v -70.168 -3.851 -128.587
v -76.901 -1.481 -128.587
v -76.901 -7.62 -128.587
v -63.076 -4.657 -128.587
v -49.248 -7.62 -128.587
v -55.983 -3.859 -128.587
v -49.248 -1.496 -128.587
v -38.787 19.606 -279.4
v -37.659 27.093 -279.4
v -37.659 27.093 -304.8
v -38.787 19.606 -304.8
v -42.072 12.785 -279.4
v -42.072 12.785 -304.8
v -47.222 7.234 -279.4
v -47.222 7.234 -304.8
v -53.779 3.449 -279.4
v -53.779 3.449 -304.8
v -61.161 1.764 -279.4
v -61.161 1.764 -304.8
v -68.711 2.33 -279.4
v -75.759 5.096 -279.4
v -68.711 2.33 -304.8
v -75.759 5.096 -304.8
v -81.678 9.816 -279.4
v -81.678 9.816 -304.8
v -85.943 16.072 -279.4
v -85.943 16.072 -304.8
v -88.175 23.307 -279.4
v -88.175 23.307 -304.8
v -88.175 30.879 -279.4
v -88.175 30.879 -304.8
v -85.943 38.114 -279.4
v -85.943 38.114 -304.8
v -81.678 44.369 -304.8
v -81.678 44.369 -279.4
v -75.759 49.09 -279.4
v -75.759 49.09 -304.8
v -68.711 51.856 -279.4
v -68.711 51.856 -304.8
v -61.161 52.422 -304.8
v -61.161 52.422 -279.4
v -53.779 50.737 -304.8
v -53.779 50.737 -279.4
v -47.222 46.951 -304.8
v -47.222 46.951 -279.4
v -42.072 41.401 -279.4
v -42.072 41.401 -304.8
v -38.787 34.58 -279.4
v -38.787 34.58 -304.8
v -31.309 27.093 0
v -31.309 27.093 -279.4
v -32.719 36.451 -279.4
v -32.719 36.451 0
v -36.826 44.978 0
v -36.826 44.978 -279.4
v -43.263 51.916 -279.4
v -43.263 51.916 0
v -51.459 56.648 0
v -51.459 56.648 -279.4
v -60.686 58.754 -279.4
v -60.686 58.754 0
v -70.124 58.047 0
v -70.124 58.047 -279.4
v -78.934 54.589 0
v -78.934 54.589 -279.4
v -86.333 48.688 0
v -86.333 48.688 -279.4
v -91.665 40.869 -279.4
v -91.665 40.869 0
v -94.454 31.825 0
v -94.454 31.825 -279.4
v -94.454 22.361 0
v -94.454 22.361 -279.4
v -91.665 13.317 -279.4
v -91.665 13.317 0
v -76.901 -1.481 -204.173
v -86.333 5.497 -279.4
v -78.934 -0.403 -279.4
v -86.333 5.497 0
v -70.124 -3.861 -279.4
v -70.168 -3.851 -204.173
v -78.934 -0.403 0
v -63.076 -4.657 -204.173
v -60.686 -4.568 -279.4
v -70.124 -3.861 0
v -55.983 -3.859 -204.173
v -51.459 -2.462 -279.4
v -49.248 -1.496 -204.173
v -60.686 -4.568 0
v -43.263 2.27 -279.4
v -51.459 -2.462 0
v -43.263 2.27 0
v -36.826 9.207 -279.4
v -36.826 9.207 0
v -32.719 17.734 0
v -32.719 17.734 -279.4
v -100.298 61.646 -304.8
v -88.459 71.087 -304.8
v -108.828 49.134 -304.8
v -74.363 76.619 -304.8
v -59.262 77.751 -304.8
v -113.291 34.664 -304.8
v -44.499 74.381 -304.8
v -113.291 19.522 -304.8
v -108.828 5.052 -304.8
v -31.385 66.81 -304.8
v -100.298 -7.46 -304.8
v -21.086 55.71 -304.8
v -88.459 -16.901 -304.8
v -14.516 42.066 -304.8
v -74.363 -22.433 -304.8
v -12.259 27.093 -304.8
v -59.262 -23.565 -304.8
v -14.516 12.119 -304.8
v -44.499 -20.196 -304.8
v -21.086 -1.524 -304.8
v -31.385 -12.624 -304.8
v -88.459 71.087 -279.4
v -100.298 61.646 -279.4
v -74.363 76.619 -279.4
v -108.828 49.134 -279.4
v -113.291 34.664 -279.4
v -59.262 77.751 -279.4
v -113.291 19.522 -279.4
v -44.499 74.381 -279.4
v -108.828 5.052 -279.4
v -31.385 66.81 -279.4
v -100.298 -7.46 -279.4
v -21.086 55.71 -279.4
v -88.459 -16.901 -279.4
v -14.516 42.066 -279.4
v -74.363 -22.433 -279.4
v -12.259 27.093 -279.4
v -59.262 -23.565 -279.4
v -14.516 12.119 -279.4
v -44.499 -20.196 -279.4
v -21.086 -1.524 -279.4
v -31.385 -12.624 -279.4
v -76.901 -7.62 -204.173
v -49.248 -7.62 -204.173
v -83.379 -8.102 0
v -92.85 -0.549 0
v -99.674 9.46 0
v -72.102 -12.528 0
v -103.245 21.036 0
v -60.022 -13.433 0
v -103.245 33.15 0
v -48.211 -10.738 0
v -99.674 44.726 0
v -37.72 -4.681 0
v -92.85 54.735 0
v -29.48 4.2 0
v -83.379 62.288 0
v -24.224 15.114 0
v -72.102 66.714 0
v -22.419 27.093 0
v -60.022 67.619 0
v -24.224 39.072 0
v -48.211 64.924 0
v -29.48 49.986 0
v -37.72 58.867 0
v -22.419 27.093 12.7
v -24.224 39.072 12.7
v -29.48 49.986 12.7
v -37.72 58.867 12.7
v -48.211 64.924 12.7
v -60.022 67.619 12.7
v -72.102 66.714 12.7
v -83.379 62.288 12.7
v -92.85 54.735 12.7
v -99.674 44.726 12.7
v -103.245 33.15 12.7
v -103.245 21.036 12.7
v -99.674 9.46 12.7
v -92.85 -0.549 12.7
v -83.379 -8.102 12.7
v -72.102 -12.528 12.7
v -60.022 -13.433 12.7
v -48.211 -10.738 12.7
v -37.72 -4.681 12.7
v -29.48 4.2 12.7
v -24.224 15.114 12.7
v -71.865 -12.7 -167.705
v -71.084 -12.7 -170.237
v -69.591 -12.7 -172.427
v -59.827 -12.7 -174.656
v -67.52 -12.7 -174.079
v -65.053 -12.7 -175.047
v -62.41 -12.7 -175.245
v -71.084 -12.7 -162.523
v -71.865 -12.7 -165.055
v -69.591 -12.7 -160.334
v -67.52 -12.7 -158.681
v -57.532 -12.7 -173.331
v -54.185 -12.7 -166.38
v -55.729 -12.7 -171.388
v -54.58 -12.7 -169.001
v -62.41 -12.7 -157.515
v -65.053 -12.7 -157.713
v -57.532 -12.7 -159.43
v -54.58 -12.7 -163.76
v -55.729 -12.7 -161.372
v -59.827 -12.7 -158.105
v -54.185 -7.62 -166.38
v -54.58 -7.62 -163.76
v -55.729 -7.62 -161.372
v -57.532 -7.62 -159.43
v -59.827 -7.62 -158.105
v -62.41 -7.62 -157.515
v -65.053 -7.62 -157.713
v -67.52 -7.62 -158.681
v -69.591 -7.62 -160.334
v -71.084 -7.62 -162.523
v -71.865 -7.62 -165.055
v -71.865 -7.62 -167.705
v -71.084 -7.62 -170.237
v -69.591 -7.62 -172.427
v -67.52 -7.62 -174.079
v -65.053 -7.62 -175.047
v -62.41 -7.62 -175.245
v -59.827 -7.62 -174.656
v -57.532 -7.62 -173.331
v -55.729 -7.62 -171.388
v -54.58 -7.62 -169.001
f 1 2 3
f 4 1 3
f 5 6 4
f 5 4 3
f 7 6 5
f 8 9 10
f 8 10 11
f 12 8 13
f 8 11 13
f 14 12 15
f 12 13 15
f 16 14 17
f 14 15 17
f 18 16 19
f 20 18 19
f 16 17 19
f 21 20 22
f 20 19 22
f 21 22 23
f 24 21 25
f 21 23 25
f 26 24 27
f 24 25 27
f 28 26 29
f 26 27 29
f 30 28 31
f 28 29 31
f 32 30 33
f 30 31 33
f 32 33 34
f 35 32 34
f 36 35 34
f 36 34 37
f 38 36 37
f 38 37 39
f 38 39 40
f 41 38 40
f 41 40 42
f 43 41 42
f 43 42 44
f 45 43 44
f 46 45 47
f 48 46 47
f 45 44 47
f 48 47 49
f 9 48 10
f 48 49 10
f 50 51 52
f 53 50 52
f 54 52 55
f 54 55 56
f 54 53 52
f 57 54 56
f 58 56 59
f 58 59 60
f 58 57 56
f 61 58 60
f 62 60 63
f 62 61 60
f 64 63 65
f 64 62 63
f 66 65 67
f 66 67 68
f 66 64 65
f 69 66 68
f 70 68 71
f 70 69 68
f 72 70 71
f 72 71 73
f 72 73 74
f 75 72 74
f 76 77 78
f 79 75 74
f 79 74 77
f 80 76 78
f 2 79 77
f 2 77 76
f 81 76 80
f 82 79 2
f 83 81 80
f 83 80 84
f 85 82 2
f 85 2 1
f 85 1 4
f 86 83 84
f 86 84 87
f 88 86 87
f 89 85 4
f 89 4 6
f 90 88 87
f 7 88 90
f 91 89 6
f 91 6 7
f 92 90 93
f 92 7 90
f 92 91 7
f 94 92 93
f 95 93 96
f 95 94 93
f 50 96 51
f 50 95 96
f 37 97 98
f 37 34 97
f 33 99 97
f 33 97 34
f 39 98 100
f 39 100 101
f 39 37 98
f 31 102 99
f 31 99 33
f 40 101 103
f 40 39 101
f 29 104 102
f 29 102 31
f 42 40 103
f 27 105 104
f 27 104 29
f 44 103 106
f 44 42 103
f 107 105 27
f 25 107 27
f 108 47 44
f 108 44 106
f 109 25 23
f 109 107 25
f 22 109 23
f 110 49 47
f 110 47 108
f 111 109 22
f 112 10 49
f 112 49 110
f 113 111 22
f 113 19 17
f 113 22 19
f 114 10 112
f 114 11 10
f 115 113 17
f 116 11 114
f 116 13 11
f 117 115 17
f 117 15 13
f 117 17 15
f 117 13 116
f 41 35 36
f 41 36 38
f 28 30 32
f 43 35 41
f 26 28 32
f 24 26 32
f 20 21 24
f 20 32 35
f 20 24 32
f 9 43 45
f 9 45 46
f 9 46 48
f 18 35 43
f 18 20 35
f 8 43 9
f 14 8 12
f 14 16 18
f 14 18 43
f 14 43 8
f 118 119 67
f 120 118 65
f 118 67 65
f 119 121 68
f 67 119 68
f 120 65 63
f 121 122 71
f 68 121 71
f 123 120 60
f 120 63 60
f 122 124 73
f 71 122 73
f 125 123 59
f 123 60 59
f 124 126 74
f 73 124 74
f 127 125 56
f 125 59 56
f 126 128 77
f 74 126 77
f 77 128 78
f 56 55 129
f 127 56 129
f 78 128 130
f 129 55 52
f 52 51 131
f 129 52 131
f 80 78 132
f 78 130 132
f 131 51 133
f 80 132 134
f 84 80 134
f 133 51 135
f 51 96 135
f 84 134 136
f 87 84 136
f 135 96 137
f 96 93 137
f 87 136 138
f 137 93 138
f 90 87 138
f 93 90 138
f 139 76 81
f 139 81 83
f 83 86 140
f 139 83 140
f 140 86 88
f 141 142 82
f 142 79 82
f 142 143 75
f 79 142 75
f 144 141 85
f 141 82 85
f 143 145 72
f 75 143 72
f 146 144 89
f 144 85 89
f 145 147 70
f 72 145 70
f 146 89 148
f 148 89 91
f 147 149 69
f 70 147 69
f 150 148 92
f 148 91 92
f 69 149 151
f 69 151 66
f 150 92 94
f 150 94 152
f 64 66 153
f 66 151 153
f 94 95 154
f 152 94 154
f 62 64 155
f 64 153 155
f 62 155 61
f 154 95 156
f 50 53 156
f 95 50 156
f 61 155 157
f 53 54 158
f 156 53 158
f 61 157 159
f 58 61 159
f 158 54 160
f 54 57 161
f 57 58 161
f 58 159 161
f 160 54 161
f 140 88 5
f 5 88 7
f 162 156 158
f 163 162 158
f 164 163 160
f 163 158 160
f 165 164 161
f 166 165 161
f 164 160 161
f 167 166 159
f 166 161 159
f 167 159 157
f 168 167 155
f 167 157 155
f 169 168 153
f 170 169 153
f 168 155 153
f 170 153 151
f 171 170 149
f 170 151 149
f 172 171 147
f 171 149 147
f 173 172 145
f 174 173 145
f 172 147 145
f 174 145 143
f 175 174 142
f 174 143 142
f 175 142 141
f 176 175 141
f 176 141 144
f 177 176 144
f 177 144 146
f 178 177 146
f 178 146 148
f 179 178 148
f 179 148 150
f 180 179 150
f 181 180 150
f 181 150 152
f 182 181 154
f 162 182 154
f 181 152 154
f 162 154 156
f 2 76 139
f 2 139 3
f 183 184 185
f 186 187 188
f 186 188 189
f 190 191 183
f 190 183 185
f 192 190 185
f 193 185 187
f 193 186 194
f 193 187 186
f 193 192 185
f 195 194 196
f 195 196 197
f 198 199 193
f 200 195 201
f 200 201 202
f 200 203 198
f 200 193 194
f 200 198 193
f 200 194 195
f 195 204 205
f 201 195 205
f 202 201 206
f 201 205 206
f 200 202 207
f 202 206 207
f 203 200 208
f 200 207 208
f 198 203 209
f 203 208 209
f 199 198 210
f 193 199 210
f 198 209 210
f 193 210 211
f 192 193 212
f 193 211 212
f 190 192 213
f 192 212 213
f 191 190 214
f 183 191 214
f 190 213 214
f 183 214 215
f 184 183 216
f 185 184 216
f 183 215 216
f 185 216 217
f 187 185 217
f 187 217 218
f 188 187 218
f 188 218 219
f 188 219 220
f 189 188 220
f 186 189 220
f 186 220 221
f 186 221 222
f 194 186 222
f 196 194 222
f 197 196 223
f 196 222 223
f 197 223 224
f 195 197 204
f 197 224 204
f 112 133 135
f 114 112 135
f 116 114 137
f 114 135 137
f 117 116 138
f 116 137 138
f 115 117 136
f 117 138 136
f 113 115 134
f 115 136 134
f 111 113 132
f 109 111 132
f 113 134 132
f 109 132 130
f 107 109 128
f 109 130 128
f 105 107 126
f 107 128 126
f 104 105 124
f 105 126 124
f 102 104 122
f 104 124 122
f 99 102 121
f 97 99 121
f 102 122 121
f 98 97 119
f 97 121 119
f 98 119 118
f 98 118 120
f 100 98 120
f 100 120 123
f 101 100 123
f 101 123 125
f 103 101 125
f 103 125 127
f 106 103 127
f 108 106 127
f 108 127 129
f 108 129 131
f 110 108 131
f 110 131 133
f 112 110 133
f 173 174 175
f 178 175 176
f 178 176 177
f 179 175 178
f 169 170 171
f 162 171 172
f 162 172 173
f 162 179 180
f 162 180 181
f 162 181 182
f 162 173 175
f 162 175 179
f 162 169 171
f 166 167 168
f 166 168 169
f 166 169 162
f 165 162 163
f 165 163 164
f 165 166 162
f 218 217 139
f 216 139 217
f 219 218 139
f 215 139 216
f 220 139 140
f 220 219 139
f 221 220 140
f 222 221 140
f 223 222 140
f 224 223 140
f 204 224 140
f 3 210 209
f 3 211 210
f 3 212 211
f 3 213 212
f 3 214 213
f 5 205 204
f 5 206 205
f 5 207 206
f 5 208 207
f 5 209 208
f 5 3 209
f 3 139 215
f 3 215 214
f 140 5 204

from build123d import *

# Parameters (mm, degrees)
F1_R      = 31.75
F2_DEPTH  = 279.4
F3_R      = 50.8
F4_DEPTH  = 50.8
F5_R      = 40.64
F6_DEPTH  = 12.7
F4_FACE_R = 50.8
F7_DEPTH  = 25.4
F8_W      = 27.653224
F8_H      = 75.585485
F9_DEPTH  = 7.62
F10_R     = 25.4
F11_DEPTH = 25.4
F12_R     = 8.89
F13_DEPTH = 5.08


with BuildPart() as f2:
    # F1 (on face) → F2 (new body)
    with BuildSketch(Plane.XY):
        with Locations((-63.058764, 27.092882)):
            Circle(F1_R)
    extrude(amount=-F2_DEPTH)

    # F3 (on face) → F4 (join)
    with BuildSketch(Plane(origin=(0, 0, -279.4), x_dir=(1, 0, 0), z_dir=(0, 0, -1))):
        with Locations((-63.058764, -27.092882)):
            Circle(F3_R)
    extrude(amount=F4_DEPTH)

    # F5 (on face) → F6 (join)
    with BuildSketch(Plane.XY):
        with Locations((-63.058764, 27.092882)):
            Circle(F5_R)
    extrude(amount=F6_DEPTH)

    # F4_face (on face) → F7 (cut)
    with BuildSketch(Plane(origin=(-63.058764, 27.092882, -330.2), x_dir=(1, 0, 0), z_dir=(0, 0, -1))):
        Circle(F4_FACE_R)
    extrude(amount=-F7_DEPTH, mode=Mode.SUBTRACT)

    # F8 (on Front) → F9 (join)
    with BuildSketch(Plane.XZ):
        with Locations((-63.074544, -166.380242)):
            Rectangle(F8_W, F8_H)
    extrude(amount=F9_DEPTH)

    # F10 (on face) → F11 (cut)
    with BuildSketch(Plane(origin=(0, 0, -304.8), x_dir=(1, 0, 0), z_dir=(0, 0, -1))):
        with Locations((-63.058764, -27.092882)):
            Circle(F10_R)
    extrude(amount=-F11_DEPTH, mode=Mode.SUBTRACT)

    # F12 (on face) → F13 (join)
    with BuildSketch(Plane.XZ.offset(7.62)):
        with Locations((-63.074544, -166.380242)):
            Circle(F12_R)
    extrude(amount=F13_DEPTH)


solid = f2.part
